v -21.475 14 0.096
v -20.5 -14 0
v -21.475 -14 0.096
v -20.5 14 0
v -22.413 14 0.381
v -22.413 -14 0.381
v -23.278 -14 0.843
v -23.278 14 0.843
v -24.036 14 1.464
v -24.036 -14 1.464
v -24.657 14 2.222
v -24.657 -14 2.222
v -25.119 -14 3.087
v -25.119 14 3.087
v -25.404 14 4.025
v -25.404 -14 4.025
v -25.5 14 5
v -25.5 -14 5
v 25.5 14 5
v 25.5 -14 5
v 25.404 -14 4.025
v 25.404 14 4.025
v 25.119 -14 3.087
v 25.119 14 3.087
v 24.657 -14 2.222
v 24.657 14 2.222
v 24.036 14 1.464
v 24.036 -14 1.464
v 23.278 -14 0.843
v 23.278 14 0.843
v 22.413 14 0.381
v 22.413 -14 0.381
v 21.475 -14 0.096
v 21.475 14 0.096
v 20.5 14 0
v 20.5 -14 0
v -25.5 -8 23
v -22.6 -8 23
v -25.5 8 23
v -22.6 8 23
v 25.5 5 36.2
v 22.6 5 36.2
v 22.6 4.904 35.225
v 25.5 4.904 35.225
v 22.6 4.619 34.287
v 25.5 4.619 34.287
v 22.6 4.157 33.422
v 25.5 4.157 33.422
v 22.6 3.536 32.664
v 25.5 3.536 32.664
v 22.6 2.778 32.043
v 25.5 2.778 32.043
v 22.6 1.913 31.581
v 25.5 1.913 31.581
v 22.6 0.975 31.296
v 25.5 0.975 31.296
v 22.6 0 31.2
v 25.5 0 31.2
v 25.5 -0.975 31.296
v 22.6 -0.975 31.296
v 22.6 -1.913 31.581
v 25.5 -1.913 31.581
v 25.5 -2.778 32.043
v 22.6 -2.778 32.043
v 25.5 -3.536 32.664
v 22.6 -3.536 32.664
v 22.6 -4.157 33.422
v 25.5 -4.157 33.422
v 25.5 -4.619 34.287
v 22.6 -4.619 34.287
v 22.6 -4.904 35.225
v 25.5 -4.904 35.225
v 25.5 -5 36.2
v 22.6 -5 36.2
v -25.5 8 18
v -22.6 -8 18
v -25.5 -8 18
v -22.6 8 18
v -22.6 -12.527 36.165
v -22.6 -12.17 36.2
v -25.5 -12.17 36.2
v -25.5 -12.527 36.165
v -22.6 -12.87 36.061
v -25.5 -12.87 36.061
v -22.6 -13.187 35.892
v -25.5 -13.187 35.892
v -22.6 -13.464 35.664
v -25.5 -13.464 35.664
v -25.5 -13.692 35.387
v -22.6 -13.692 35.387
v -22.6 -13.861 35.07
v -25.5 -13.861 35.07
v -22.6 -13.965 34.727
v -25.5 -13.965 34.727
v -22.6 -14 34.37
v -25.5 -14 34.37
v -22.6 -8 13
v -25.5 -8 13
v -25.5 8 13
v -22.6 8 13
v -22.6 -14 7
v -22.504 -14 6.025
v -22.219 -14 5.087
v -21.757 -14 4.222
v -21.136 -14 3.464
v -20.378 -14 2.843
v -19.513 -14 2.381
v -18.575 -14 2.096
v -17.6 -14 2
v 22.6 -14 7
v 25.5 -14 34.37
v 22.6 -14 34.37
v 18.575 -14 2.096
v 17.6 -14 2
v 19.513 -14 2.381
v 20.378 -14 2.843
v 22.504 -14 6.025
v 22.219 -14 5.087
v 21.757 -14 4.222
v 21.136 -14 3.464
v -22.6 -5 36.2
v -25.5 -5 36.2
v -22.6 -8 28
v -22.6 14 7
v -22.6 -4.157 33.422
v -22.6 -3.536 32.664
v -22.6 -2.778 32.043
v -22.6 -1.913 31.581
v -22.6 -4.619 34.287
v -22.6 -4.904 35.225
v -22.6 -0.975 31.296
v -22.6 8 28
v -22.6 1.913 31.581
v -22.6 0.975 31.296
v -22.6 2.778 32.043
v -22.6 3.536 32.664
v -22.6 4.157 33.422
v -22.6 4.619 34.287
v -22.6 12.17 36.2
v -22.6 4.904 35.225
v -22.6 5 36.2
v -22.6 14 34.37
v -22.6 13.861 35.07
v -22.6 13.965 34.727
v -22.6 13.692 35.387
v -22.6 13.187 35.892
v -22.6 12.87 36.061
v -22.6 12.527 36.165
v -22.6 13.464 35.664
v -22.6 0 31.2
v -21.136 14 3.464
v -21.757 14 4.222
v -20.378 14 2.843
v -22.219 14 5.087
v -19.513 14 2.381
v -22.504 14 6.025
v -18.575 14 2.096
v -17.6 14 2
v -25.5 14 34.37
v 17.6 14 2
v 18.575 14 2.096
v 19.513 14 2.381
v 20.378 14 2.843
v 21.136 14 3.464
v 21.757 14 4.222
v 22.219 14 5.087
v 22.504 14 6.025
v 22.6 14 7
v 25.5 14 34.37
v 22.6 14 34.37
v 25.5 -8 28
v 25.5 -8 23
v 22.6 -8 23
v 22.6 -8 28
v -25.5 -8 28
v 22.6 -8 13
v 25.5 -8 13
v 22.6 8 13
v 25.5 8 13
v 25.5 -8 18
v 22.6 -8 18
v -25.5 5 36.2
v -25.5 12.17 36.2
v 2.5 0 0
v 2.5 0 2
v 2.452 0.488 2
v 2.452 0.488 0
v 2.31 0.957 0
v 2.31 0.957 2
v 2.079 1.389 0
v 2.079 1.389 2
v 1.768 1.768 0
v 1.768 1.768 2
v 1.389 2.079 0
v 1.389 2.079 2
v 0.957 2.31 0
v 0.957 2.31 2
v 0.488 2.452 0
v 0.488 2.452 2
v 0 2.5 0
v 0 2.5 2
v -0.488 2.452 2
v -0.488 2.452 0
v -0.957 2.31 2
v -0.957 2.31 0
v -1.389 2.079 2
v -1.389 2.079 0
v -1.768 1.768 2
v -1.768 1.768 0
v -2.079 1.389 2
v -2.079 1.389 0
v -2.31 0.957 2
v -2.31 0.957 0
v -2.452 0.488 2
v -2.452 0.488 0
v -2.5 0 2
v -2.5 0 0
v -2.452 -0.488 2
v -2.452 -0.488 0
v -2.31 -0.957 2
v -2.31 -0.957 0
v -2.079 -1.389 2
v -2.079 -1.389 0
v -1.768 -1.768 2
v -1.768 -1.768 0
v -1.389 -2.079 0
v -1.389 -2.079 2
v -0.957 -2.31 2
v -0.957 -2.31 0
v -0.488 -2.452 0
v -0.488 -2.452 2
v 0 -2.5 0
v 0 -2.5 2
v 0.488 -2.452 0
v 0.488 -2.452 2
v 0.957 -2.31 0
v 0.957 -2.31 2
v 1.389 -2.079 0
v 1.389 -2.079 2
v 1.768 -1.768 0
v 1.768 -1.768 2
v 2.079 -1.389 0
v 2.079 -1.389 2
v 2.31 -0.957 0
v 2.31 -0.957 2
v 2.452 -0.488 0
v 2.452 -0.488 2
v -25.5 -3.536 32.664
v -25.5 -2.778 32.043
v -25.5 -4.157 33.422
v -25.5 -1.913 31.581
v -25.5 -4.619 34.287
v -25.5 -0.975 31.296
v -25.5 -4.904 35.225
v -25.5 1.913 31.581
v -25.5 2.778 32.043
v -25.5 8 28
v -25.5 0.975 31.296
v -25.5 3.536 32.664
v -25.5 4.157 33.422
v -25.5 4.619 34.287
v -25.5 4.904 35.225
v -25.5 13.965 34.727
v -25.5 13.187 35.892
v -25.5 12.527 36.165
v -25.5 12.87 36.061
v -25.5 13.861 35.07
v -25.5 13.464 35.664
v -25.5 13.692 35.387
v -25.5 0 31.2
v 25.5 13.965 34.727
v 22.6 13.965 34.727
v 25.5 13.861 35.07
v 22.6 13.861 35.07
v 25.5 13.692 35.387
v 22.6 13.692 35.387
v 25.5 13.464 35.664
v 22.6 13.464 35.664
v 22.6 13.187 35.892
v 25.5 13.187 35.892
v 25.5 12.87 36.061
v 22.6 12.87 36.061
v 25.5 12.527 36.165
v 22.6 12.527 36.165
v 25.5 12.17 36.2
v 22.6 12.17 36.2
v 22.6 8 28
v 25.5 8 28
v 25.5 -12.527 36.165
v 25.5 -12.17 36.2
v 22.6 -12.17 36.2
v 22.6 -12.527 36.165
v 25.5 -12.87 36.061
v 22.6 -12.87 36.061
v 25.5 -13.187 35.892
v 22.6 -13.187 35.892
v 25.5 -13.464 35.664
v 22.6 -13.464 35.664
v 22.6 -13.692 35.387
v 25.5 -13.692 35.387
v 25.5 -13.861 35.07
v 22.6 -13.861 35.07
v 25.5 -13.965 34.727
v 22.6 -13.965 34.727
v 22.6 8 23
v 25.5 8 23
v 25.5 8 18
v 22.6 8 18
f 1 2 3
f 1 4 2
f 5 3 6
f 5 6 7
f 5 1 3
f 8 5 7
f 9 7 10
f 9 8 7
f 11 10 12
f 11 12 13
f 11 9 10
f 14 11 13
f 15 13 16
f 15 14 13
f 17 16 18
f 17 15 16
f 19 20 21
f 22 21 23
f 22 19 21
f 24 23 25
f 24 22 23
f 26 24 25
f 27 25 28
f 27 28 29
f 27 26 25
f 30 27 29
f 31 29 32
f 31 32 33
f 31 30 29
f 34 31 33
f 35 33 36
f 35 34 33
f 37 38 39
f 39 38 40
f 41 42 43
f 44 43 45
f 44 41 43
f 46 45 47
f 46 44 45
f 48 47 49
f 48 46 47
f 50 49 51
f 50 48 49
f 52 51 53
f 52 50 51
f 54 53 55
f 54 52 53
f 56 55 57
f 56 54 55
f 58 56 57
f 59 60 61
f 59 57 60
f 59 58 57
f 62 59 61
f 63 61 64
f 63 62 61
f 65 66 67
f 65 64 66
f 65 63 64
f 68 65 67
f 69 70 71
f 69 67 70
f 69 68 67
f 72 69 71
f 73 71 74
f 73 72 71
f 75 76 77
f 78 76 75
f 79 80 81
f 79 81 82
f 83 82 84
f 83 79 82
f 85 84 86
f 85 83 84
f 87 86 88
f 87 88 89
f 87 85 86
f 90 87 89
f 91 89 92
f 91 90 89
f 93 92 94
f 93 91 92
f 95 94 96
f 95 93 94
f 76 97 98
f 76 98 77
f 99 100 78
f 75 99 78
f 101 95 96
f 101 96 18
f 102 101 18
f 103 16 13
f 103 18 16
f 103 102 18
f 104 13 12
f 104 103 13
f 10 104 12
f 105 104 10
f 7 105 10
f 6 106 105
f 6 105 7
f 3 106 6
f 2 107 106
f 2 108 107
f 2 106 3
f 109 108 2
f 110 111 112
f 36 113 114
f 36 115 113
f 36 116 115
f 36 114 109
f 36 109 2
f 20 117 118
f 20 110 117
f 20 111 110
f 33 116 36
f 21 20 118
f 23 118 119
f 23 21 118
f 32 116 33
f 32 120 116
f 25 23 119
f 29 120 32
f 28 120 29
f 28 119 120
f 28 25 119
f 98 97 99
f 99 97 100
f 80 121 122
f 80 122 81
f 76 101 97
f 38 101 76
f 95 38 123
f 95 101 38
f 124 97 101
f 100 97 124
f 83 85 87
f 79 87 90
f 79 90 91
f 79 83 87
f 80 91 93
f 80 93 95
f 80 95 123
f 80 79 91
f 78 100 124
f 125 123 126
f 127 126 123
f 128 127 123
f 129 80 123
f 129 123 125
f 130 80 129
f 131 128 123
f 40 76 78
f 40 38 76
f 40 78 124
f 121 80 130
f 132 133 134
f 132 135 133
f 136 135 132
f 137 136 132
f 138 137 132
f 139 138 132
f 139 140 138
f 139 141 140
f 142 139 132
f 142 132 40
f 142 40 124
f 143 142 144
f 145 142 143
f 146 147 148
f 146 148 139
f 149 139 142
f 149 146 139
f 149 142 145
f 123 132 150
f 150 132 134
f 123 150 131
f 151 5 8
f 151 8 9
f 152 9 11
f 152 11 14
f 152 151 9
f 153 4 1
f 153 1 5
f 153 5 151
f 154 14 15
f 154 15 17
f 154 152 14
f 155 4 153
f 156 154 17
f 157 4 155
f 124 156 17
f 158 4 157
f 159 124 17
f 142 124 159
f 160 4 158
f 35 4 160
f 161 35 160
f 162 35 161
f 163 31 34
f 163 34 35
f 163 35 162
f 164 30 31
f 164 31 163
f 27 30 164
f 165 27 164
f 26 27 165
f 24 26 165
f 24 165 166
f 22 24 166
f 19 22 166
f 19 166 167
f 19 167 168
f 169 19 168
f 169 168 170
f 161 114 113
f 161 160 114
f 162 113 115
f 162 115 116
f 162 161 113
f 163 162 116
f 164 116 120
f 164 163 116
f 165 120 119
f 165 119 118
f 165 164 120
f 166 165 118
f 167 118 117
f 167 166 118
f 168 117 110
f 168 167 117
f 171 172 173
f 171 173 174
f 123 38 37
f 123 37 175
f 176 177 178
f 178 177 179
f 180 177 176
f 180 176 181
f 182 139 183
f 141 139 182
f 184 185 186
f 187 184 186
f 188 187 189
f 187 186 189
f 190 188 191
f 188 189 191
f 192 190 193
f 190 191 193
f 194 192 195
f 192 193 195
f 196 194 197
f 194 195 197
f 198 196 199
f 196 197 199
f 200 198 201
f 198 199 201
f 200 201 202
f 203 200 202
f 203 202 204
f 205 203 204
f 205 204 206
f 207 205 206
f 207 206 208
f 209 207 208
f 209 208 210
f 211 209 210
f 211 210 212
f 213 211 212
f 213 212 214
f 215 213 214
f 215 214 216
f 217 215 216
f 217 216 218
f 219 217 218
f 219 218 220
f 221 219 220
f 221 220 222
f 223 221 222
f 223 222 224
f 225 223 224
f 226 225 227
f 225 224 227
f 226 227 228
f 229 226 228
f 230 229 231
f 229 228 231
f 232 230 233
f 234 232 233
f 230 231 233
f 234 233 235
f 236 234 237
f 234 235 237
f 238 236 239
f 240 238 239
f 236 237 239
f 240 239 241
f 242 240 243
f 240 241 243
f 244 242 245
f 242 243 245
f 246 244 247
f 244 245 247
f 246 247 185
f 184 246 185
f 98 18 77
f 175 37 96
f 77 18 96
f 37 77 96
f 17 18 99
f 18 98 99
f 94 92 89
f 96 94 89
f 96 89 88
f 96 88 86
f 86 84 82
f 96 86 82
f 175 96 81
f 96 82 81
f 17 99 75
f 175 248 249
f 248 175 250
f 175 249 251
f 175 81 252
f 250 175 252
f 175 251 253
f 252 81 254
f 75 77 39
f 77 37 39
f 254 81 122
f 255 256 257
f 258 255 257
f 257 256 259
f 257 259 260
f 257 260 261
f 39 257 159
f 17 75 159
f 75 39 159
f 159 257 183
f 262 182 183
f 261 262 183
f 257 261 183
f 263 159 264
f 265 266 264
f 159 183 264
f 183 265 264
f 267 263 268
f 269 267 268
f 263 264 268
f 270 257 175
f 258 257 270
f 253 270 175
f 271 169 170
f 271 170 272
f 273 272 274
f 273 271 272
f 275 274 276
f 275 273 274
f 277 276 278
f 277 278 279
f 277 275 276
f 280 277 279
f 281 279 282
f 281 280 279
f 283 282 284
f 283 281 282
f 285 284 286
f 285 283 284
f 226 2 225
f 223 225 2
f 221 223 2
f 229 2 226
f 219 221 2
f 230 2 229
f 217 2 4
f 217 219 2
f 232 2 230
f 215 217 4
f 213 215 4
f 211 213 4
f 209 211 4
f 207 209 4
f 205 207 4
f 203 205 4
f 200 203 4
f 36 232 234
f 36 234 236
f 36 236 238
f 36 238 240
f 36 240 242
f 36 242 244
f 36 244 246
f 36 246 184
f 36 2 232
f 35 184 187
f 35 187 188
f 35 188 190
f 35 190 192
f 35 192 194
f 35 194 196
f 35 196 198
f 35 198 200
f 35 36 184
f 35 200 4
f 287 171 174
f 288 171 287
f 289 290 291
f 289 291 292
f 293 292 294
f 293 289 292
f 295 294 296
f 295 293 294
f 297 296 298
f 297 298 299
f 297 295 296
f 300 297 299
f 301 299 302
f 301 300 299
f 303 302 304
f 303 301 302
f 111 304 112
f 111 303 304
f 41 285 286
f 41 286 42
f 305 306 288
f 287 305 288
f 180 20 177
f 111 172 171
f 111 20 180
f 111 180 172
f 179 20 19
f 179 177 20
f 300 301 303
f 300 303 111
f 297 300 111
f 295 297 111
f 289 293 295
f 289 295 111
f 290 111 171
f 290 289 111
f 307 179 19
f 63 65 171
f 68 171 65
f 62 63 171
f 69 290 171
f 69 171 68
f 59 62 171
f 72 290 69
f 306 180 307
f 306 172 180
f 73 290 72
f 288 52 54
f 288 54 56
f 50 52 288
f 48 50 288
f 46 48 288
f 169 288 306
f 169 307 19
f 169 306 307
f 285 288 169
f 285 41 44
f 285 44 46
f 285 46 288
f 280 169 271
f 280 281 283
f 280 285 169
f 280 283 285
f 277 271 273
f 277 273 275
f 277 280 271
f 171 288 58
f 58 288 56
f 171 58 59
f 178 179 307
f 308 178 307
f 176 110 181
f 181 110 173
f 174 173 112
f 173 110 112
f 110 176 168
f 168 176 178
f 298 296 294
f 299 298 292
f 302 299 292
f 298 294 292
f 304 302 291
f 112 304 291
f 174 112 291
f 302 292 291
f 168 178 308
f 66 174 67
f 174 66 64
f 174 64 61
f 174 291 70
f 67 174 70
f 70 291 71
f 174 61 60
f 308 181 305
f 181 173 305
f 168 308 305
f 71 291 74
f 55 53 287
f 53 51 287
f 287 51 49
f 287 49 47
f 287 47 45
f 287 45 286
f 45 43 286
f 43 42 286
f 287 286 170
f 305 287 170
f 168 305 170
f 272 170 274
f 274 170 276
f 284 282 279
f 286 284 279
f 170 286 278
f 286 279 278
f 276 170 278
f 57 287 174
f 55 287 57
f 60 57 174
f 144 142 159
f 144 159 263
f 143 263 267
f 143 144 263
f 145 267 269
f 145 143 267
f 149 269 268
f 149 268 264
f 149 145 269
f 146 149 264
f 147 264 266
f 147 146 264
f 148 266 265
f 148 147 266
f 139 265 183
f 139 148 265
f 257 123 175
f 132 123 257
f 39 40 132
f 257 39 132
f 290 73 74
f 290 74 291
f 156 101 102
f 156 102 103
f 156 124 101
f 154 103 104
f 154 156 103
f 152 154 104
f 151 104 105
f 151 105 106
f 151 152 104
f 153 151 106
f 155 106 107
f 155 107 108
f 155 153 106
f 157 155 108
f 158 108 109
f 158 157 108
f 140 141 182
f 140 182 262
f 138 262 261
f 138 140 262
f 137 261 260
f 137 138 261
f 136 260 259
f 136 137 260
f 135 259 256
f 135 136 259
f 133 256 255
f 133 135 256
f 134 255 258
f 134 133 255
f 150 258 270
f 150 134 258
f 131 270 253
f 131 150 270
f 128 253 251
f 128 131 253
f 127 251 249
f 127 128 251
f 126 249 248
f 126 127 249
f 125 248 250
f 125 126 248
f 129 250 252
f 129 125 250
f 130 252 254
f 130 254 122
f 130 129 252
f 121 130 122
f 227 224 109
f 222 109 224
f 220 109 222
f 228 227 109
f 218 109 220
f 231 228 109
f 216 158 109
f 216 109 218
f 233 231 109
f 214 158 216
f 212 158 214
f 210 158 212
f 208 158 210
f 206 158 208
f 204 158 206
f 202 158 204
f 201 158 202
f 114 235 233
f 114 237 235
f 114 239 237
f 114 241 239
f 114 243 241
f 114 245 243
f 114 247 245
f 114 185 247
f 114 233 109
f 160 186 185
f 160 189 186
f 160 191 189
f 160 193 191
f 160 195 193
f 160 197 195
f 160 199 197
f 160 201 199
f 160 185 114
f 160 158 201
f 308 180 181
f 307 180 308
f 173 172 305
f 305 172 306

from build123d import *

# Parameters (mm, degrees)
F0_W     = 16
F0_H     = 5
F1_DEPTH = 25.5
F2_W     = 45.2
F2_H     = 42.82105
F3_DEPTH = 34.2
F4_R     = 2.5
F5_DEPTH = 2.001
F6_R     = 5


with BuildPart() as f1:
    # F0 (on Right) → F1 (new body, symmetric)
    with BuildSketch(Plane.YZ):
        with BuildLine():
            Line((-14, 34.369719), (-14, 0))
            Line((-14, 0), (14, 0))
            Line((14, 0), (14, 34.369719))
            ThreePointArc((14, 34.369719), (13.463923, 35.663923), (12.169719, 36.2))
            Line((12.169719, 36.2), (5, 36.2))
            ThreePointArc((5, 36.2), (0, 31.2), (-5, 36.2))
            Line((-5, 36.2), (-12.169719, 36.2))
            ThreePointArc((-12.169719, 36.2), (-13.463923, 35.663923), (-14, 34.369719))
        make_face()
        with Locations((0, 15.5)):
            Rectangle(F0_W, F0_H, mode=Mode.SUBTRACT)
        with Locations((0, 25.5)):
            Rectangle(F0_W, F0_H, mode=Mode.SUBTRACT)
    extrude(amount=F1_DEPTH, both=True)

    # F2 (on face) → F3 (cut)
    with BuildSketch(Plane.XY.offset(36.2)):
        with Locations((0, 0.389209)):
            Rectangle(F2_W, F2_H)
    extrude(amount=-F3_DEPTH, mode=Mode.SUBTRACT)

    # F4 (on face) → F5 (cut, through all)
    with BuildSketch(Plane.XY.offset(2)):
        Circle(F4_R)
    extrude(amount=-F5_DEPTH, mode=Mode.SUBTRACT)

    # F6
    f6_edges = [f1.edges().sort_by_distance(p)[0] for p in [
        (25.5, 0, 0),
        (22.6, 0, 2),
        (-22.6, 0, 2),
        (-25.5, 0, 0),
    ]]
    fillet(f6_edges, radius=F6_R)


solid = f1.part
